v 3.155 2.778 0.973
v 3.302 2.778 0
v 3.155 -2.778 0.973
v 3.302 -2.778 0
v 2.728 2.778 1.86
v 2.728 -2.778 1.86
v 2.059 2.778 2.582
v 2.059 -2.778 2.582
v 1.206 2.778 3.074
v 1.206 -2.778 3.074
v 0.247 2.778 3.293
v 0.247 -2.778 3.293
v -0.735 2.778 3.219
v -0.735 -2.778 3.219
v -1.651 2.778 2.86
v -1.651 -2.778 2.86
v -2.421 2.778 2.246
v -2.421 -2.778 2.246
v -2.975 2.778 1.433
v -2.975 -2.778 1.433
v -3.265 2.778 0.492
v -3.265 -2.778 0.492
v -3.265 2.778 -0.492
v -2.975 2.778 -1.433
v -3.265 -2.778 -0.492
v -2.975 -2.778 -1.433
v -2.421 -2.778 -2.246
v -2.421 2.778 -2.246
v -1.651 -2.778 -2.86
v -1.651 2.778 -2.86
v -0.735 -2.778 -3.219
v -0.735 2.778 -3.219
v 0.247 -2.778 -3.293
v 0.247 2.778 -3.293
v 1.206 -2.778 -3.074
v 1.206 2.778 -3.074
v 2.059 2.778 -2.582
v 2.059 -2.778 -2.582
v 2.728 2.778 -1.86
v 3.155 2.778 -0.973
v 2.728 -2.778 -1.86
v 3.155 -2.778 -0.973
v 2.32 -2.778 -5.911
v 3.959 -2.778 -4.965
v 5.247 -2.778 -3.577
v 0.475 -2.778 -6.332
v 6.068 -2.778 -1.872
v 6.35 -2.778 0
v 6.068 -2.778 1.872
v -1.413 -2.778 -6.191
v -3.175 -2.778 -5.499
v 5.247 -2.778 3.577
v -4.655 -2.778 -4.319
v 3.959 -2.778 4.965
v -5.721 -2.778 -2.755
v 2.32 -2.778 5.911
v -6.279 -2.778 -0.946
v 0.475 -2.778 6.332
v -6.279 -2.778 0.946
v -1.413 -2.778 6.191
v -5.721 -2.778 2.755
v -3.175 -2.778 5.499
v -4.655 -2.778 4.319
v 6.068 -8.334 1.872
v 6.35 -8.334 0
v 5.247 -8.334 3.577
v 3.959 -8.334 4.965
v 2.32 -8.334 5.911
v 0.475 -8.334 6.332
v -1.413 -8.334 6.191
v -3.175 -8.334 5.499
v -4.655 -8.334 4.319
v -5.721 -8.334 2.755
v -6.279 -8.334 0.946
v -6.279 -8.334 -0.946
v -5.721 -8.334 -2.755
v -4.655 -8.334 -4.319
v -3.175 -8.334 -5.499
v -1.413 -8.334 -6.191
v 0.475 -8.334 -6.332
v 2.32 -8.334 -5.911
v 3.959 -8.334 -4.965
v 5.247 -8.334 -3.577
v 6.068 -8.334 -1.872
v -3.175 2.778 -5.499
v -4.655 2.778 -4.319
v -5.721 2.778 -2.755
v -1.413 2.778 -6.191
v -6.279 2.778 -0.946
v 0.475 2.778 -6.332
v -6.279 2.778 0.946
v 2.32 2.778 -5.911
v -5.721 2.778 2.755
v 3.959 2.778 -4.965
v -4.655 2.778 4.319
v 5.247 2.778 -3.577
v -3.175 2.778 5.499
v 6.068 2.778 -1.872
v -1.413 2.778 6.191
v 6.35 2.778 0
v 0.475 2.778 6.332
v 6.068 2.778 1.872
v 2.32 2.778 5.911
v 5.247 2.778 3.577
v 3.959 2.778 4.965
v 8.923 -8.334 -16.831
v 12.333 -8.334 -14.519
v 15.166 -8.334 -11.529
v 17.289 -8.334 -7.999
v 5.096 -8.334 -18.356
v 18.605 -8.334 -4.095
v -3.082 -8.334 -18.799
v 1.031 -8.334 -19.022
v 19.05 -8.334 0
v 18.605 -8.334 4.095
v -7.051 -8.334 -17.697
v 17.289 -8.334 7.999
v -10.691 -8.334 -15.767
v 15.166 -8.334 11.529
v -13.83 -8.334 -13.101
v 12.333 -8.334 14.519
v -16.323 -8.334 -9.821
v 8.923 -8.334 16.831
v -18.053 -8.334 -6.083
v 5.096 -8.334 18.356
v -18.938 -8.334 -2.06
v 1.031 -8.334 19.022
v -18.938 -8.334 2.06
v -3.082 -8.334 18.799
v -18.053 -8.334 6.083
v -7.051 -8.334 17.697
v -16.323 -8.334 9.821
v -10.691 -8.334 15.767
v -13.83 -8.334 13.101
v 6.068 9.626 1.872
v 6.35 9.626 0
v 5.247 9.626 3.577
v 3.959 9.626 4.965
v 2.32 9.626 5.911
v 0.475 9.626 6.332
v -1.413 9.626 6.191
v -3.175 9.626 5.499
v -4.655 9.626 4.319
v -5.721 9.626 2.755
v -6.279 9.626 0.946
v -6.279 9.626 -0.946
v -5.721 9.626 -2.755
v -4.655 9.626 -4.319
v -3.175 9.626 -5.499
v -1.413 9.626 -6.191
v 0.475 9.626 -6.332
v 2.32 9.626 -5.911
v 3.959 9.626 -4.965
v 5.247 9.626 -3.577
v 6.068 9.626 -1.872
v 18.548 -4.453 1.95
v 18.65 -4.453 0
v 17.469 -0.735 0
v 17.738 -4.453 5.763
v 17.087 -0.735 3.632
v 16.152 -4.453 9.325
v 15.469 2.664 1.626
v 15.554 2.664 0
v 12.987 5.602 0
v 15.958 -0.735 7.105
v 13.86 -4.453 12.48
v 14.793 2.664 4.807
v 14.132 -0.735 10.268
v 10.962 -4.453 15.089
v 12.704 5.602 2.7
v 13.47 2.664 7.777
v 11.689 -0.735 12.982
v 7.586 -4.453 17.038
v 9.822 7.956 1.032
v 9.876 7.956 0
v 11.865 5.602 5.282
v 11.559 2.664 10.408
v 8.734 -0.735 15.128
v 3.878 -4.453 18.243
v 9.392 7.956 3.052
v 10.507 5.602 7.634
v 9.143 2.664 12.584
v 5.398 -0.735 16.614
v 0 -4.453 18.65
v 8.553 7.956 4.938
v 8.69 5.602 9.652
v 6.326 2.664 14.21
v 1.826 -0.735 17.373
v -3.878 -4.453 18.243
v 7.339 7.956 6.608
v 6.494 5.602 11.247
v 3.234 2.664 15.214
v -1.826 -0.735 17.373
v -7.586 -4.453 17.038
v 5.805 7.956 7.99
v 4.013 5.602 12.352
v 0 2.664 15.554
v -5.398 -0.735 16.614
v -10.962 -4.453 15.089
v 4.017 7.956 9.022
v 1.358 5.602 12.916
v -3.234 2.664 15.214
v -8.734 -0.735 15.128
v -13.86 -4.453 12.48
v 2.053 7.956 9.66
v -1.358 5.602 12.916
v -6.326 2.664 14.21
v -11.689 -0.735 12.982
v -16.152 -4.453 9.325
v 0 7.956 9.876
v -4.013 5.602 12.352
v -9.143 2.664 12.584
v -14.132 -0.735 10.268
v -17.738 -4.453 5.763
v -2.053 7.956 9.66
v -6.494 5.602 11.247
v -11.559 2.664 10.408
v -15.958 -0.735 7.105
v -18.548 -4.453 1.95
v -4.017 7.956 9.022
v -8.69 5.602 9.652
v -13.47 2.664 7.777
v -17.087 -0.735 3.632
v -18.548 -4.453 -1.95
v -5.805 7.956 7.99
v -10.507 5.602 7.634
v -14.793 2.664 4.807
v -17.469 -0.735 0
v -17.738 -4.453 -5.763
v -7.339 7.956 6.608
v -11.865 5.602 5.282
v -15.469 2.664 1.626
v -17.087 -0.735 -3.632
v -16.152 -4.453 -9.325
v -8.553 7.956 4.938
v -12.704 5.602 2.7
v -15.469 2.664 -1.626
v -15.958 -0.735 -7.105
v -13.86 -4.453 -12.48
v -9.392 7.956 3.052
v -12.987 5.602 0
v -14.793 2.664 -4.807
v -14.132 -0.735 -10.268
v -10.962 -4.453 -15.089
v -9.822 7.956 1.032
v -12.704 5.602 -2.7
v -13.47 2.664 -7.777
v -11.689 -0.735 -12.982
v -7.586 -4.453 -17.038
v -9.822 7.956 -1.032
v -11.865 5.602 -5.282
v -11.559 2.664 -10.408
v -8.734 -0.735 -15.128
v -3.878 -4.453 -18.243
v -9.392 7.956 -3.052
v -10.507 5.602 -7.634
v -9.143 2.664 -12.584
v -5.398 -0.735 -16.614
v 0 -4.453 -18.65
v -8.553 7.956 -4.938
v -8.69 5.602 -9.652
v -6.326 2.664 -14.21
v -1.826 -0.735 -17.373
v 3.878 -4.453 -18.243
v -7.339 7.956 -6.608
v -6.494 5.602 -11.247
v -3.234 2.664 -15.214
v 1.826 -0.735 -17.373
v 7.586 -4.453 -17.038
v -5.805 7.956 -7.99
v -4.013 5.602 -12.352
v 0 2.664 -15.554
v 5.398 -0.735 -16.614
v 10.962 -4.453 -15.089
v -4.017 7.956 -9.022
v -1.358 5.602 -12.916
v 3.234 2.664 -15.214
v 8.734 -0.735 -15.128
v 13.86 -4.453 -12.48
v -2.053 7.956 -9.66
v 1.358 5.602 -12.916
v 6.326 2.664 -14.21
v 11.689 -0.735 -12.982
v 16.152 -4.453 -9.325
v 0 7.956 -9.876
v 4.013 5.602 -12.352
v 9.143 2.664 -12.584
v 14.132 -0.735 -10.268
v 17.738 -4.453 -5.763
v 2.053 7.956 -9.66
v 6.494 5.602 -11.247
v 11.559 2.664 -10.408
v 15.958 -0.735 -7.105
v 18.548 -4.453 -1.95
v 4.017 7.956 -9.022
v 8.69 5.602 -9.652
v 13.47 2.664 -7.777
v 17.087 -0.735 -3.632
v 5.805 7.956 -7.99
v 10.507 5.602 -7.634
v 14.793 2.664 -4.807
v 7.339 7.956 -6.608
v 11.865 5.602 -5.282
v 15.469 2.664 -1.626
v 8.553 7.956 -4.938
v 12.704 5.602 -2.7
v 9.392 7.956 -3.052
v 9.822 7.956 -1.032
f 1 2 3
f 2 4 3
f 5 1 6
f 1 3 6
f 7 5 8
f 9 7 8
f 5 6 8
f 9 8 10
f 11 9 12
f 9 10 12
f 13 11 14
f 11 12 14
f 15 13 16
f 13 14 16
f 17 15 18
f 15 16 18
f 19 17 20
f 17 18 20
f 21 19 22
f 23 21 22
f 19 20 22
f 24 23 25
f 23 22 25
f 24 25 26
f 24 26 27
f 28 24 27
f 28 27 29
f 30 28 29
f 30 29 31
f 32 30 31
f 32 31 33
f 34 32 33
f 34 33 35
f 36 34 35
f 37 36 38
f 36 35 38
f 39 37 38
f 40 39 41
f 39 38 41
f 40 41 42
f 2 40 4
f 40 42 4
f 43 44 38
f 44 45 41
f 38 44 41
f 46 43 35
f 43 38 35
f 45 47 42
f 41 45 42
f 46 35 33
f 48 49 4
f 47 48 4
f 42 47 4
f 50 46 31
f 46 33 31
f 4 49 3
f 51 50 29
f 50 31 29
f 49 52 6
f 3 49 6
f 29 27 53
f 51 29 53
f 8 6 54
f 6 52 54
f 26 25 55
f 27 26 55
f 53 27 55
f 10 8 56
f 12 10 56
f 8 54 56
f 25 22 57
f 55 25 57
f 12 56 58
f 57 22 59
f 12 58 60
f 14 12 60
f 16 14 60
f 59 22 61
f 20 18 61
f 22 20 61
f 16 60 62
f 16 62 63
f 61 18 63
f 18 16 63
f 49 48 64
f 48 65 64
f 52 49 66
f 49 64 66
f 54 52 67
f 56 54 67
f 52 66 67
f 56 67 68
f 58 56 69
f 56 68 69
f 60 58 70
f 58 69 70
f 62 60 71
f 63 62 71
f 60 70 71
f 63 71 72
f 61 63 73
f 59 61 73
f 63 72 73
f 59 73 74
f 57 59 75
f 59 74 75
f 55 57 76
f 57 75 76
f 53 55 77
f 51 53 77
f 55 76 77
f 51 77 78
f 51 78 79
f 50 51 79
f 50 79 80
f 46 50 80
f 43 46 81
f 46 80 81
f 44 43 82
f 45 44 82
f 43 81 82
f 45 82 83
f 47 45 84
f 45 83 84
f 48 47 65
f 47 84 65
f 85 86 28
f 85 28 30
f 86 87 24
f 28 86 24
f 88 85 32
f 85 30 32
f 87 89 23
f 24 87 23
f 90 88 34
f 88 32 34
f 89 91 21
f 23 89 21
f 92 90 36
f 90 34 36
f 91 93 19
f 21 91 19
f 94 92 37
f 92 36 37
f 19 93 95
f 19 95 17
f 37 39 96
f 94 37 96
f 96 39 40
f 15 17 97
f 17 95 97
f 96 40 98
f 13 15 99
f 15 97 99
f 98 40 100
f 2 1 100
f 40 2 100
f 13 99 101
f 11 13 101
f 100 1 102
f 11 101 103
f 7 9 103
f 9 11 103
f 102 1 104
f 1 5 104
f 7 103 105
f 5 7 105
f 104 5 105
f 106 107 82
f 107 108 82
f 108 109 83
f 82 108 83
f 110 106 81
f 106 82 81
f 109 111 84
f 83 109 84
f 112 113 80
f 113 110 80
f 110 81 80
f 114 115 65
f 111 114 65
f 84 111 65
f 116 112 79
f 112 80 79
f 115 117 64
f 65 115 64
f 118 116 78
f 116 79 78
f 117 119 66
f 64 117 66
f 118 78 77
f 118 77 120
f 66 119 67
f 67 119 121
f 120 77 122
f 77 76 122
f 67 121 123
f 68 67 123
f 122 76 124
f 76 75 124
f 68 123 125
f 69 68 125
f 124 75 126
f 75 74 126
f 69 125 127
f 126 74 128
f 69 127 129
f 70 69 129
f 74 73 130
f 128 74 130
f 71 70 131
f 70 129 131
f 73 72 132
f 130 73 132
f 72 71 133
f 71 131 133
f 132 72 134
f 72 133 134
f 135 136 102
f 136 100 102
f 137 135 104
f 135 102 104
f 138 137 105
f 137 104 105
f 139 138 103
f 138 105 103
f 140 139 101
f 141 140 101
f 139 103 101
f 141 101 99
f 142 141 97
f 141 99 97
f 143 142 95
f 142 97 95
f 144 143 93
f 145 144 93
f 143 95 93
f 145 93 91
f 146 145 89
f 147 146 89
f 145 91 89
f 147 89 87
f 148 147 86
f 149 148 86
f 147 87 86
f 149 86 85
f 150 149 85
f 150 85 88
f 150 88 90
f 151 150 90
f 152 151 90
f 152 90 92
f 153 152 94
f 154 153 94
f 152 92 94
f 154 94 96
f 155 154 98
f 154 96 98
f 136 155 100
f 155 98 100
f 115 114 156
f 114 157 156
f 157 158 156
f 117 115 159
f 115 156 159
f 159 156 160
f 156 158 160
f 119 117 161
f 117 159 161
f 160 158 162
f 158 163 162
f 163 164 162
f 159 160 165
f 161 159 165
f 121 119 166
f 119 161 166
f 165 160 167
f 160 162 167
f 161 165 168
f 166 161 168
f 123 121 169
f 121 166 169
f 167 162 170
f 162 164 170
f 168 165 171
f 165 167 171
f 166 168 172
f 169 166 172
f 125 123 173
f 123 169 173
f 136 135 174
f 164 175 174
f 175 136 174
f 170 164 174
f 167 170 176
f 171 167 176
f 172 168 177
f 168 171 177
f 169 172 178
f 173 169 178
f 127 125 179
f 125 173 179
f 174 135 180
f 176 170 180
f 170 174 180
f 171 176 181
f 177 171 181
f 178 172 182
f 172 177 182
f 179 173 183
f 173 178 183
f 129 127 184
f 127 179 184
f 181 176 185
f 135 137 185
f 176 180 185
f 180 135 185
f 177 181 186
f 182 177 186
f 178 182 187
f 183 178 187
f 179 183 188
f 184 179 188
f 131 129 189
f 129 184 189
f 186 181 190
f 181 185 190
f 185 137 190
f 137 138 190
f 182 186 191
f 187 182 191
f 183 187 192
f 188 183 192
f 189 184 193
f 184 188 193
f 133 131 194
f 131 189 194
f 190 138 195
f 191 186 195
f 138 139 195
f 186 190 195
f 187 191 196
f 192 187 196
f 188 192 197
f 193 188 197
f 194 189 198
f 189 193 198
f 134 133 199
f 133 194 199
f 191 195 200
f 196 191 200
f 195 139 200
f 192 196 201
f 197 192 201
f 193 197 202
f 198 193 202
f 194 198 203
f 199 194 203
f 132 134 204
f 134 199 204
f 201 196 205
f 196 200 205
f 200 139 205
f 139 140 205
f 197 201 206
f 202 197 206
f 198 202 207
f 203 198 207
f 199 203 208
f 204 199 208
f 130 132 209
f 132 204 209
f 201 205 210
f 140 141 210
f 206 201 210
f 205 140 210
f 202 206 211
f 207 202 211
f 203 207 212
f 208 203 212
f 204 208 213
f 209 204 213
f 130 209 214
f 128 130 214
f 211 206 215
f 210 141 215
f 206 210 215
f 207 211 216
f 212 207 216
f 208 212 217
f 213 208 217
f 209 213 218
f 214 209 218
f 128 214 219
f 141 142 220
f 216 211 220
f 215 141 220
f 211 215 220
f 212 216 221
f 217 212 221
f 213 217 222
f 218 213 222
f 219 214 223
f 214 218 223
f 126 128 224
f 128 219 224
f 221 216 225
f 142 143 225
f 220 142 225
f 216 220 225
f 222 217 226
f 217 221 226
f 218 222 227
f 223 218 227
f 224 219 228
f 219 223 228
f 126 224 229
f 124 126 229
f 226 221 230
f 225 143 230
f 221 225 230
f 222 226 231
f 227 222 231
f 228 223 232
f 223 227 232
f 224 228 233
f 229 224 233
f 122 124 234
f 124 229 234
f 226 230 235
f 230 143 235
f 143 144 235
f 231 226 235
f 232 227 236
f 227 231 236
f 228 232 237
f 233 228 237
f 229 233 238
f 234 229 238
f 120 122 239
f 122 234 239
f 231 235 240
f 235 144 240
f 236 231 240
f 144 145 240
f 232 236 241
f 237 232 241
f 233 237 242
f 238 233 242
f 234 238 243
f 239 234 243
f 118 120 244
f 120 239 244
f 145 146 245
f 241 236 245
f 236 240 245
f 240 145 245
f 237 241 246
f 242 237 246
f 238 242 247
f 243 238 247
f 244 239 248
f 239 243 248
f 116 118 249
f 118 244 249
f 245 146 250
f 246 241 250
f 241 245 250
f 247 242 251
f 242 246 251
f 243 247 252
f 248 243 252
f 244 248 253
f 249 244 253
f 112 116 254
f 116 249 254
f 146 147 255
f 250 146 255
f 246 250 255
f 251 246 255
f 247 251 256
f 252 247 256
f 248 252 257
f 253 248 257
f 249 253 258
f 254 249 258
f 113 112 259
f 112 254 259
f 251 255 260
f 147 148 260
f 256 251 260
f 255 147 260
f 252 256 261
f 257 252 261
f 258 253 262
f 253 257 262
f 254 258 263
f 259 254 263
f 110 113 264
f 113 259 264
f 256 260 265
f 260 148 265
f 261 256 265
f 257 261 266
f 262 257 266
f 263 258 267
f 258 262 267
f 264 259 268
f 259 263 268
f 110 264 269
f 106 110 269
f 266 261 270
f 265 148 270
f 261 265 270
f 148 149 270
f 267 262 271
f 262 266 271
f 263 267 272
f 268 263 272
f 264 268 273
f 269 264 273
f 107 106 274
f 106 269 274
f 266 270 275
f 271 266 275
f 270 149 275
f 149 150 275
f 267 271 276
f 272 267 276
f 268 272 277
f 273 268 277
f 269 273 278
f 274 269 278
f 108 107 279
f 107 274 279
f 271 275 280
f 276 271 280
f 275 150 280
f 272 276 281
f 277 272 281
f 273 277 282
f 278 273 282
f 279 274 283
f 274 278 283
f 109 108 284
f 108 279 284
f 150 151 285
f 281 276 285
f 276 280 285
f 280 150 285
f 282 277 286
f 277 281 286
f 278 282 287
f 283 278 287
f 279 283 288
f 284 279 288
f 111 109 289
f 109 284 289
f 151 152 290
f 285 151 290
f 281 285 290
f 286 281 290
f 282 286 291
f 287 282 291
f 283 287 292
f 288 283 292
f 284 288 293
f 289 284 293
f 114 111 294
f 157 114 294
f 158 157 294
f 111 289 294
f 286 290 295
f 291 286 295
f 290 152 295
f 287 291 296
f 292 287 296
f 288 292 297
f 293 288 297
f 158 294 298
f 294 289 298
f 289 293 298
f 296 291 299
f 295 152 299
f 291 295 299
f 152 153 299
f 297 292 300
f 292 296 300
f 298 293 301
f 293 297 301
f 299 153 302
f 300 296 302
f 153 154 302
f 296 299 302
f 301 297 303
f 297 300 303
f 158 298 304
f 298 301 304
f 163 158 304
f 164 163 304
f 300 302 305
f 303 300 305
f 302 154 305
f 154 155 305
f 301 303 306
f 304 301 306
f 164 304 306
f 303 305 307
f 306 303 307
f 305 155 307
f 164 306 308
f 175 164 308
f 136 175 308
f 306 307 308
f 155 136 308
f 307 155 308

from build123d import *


with BuildPart() as part:
    # Sketch1 → Revolve1 (revolve)
    with BuildSketch(Plane.XY):
        with BuildLine():
            Line((6.35, -2.778125), (6.35, -8.334375))
            Line((6.35, -8.334375), (19.05, -8.334375))
            ThreePointArc((19.05, -8.334375), (15.554259867, 2.664147628), (6.35, 9.626137242))
            Line((6.35, 9.626137242), (6.35, 8.334375))
            Line((6.35, 8.334375), (6.35, 2.778125))
            Line((6.35, 2.778125), (3.302, 2.778125))
            Line((3.302, 2.778125), (3.302, 0))
            Line((3.302, 0), (3.302, -2.778125))
            Line((3.302, -2.778125), (6.35, -2.778125))
        make_face()
    revolve(axis=Axis((0, -2.778125, 0), (0, -1, 0)))


solid = part.part
